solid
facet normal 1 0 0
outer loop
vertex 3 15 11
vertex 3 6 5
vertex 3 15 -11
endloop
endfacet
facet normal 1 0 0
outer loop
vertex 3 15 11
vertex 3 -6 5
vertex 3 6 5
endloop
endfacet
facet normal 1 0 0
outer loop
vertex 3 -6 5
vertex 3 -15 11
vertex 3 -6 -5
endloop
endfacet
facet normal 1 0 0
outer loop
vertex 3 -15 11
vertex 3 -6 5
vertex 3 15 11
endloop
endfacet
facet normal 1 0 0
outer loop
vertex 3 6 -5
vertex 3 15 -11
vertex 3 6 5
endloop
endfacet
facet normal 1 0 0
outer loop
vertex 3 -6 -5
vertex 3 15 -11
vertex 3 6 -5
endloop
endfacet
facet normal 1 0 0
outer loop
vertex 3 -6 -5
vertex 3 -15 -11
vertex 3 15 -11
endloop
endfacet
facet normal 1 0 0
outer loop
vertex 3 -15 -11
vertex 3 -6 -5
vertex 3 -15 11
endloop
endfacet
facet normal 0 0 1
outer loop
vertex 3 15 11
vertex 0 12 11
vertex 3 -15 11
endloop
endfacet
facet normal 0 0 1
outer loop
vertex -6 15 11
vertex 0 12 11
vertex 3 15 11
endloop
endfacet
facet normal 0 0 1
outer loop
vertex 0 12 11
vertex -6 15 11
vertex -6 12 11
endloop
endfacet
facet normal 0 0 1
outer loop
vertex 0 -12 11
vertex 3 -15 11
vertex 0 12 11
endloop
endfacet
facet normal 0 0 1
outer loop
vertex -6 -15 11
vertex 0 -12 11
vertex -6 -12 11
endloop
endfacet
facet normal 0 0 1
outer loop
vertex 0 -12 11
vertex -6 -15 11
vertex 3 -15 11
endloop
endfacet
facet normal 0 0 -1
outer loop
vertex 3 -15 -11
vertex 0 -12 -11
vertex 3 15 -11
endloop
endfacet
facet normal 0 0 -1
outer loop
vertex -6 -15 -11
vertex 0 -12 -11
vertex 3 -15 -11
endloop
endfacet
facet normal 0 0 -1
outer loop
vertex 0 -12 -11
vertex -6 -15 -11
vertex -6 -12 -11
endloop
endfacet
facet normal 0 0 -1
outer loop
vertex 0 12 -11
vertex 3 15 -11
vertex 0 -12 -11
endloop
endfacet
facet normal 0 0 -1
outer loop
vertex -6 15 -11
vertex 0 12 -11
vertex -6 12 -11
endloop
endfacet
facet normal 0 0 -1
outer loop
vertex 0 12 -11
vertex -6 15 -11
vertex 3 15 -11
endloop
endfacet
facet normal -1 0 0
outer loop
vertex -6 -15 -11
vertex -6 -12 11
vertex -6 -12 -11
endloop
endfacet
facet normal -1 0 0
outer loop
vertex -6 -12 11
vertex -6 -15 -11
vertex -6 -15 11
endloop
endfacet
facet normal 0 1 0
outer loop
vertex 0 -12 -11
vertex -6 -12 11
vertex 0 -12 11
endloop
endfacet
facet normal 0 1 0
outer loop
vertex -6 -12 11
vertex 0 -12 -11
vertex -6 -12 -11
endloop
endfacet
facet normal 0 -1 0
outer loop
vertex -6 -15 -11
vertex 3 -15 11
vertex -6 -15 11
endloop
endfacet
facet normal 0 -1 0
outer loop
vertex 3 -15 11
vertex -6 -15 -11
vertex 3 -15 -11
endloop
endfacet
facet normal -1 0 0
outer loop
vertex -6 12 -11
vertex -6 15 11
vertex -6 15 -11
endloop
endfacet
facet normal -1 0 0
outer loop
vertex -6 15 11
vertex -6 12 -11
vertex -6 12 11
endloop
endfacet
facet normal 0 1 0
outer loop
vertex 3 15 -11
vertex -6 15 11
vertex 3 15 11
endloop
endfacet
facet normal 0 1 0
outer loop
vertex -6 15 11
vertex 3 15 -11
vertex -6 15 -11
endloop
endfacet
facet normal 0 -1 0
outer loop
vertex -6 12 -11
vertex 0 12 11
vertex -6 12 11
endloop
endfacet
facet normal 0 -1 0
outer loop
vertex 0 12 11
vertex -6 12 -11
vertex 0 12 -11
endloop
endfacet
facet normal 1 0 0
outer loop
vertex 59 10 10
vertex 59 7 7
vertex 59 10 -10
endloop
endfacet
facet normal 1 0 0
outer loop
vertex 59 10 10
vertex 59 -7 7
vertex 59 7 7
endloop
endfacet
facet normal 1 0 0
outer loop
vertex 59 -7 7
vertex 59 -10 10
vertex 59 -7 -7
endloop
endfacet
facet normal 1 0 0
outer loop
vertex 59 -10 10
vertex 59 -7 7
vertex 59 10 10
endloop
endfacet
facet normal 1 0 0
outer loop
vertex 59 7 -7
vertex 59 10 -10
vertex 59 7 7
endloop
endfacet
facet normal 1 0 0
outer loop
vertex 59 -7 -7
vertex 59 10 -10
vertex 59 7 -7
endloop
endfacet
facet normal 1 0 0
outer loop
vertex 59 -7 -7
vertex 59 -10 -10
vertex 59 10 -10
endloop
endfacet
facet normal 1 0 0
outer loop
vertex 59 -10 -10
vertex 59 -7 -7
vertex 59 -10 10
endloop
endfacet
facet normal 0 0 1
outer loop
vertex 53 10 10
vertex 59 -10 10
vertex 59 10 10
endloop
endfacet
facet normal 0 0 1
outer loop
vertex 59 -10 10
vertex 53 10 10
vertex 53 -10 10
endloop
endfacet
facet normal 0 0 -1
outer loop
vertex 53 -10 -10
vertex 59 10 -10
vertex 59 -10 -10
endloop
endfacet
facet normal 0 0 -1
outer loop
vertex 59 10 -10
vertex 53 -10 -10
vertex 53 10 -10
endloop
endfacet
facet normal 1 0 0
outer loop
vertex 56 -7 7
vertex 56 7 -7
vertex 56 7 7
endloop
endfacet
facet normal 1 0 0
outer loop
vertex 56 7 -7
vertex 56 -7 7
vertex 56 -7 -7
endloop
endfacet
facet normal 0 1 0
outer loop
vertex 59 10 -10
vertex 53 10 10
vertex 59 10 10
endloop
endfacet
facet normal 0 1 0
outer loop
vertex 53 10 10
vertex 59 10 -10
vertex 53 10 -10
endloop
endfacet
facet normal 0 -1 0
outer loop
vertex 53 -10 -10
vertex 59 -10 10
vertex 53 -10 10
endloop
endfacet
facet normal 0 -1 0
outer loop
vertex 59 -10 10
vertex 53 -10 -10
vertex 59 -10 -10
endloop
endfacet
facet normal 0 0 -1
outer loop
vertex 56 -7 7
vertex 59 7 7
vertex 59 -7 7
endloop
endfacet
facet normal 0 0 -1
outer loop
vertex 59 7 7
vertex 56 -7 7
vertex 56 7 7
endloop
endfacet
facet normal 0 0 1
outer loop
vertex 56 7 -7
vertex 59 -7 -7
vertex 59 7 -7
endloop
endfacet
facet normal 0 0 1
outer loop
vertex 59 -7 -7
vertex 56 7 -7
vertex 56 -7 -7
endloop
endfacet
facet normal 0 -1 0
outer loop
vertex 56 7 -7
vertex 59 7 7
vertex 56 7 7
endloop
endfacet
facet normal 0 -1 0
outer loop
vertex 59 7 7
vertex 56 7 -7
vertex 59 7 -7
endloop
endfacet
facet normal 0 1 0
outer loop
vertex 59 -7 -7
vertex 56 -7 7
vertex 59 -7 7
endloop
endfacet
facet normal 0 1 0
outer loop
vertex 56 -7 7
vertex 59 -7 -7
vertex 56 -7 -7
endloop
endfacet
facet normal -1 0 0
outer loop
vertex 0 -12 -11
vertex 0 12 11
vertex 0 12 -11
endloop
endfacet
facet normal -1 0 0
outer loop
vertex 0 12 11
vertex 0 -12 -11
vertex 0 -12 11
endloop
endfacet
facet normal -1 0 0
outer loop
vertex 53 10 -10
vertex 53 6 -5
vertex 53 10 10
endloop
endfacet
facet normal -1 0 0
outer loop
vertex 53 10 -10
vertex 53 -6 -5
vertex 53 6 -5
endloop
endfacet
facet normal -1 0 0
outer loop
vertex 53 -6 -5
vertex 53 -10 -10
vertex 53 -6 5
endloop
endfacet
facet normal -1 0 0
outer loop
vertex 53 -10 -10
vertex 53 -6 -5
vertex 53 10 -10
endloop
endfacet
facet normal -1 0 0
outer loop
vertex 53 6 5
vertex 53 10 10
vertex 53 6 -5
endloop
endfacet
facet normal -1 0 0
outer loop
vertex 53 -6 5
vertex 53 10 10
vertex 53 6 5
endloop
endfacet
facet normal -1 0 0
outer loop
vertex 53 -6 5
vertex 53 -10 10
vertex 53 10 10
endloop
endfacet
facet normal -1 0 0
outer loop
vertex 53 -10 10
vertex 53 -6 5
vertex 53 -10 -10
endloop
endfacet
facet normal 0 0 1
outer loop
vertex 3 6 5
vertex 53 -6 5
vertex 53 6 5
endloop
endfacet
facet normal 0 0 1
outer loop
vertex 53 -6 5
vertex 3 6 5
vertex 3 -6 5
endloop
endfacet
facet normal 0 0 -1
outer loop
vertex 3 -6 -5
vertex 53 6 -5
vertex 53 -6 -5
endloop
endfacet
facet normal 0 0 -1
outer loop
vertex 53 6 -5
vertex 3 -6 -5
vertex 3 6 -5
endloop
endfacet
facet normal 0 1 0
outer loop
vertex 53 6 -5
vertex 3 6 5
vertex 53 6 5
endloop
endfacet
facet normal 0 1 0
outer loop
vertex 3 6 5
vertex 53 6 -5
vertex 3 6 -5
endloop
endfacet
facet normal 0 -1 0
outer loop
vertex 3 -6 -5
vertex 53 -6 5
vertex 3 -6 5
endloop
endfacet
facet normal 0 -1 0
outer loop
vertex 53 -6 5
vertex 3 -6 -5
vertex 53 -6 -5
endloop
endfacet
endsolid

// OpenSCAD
// Çamaşır makinesi düğme bastırıcı - parametrik (mm)
L        = 50;   // MAVİ parçanın yüzü ile DÜĞMENİN arkası arasındaki mesafe -> ölç, buraya yaz
mavi_w   = 30;   // mavi parçaya dayanan plaka genişliği
mavi_h   = 22;   // plaka yüksekliği
kol_w    = 12;   // gövde (çubuk) kalınlığı
kol_h    = 10;
duz_t    = 3;    // plaka kalınlığı
dudak    = 6;    // mavi parçayı tutan dudak boyu
dugme_w  = 14;   // düğme ucunun ölçüsü (cep iç boyutu)
duvar    = 3;

// mavi tarafı: plaka + üst/alt tutma dudakları
translate([0,-mavi_w/2,-mavi_h/2]) cube([duz_t,mavi_w,mavi_h]);
for (s=[-1,1]) translate([-dudak, s>0 ? mavi_w/2-duz_t : -mavi_w/2, -mavi_h/2]) cube([dudak+duz_t,duz_t,mavi_h]);
// çubuk
translate([duz_t,-kol_w/2,-kol_h/2]) cube([L,kol_w,kol_h]);
// düğme tarafı: plaka + 4 duvarlı cep
D = dugme_w + 2*duvar;
translate([duz_t+L,-D/2,-D/2]) cube([duz_t,D,D]);
translate([2*duz_t+L,0,0]) difference(){
  translate([0,-D/2,-D/2]) cube([duvar,D,D]);
  translate([-1,-dugme_w/2,-dugme_w/2]) cube([duvar+2,dugme_w,dugme_w]);
}
